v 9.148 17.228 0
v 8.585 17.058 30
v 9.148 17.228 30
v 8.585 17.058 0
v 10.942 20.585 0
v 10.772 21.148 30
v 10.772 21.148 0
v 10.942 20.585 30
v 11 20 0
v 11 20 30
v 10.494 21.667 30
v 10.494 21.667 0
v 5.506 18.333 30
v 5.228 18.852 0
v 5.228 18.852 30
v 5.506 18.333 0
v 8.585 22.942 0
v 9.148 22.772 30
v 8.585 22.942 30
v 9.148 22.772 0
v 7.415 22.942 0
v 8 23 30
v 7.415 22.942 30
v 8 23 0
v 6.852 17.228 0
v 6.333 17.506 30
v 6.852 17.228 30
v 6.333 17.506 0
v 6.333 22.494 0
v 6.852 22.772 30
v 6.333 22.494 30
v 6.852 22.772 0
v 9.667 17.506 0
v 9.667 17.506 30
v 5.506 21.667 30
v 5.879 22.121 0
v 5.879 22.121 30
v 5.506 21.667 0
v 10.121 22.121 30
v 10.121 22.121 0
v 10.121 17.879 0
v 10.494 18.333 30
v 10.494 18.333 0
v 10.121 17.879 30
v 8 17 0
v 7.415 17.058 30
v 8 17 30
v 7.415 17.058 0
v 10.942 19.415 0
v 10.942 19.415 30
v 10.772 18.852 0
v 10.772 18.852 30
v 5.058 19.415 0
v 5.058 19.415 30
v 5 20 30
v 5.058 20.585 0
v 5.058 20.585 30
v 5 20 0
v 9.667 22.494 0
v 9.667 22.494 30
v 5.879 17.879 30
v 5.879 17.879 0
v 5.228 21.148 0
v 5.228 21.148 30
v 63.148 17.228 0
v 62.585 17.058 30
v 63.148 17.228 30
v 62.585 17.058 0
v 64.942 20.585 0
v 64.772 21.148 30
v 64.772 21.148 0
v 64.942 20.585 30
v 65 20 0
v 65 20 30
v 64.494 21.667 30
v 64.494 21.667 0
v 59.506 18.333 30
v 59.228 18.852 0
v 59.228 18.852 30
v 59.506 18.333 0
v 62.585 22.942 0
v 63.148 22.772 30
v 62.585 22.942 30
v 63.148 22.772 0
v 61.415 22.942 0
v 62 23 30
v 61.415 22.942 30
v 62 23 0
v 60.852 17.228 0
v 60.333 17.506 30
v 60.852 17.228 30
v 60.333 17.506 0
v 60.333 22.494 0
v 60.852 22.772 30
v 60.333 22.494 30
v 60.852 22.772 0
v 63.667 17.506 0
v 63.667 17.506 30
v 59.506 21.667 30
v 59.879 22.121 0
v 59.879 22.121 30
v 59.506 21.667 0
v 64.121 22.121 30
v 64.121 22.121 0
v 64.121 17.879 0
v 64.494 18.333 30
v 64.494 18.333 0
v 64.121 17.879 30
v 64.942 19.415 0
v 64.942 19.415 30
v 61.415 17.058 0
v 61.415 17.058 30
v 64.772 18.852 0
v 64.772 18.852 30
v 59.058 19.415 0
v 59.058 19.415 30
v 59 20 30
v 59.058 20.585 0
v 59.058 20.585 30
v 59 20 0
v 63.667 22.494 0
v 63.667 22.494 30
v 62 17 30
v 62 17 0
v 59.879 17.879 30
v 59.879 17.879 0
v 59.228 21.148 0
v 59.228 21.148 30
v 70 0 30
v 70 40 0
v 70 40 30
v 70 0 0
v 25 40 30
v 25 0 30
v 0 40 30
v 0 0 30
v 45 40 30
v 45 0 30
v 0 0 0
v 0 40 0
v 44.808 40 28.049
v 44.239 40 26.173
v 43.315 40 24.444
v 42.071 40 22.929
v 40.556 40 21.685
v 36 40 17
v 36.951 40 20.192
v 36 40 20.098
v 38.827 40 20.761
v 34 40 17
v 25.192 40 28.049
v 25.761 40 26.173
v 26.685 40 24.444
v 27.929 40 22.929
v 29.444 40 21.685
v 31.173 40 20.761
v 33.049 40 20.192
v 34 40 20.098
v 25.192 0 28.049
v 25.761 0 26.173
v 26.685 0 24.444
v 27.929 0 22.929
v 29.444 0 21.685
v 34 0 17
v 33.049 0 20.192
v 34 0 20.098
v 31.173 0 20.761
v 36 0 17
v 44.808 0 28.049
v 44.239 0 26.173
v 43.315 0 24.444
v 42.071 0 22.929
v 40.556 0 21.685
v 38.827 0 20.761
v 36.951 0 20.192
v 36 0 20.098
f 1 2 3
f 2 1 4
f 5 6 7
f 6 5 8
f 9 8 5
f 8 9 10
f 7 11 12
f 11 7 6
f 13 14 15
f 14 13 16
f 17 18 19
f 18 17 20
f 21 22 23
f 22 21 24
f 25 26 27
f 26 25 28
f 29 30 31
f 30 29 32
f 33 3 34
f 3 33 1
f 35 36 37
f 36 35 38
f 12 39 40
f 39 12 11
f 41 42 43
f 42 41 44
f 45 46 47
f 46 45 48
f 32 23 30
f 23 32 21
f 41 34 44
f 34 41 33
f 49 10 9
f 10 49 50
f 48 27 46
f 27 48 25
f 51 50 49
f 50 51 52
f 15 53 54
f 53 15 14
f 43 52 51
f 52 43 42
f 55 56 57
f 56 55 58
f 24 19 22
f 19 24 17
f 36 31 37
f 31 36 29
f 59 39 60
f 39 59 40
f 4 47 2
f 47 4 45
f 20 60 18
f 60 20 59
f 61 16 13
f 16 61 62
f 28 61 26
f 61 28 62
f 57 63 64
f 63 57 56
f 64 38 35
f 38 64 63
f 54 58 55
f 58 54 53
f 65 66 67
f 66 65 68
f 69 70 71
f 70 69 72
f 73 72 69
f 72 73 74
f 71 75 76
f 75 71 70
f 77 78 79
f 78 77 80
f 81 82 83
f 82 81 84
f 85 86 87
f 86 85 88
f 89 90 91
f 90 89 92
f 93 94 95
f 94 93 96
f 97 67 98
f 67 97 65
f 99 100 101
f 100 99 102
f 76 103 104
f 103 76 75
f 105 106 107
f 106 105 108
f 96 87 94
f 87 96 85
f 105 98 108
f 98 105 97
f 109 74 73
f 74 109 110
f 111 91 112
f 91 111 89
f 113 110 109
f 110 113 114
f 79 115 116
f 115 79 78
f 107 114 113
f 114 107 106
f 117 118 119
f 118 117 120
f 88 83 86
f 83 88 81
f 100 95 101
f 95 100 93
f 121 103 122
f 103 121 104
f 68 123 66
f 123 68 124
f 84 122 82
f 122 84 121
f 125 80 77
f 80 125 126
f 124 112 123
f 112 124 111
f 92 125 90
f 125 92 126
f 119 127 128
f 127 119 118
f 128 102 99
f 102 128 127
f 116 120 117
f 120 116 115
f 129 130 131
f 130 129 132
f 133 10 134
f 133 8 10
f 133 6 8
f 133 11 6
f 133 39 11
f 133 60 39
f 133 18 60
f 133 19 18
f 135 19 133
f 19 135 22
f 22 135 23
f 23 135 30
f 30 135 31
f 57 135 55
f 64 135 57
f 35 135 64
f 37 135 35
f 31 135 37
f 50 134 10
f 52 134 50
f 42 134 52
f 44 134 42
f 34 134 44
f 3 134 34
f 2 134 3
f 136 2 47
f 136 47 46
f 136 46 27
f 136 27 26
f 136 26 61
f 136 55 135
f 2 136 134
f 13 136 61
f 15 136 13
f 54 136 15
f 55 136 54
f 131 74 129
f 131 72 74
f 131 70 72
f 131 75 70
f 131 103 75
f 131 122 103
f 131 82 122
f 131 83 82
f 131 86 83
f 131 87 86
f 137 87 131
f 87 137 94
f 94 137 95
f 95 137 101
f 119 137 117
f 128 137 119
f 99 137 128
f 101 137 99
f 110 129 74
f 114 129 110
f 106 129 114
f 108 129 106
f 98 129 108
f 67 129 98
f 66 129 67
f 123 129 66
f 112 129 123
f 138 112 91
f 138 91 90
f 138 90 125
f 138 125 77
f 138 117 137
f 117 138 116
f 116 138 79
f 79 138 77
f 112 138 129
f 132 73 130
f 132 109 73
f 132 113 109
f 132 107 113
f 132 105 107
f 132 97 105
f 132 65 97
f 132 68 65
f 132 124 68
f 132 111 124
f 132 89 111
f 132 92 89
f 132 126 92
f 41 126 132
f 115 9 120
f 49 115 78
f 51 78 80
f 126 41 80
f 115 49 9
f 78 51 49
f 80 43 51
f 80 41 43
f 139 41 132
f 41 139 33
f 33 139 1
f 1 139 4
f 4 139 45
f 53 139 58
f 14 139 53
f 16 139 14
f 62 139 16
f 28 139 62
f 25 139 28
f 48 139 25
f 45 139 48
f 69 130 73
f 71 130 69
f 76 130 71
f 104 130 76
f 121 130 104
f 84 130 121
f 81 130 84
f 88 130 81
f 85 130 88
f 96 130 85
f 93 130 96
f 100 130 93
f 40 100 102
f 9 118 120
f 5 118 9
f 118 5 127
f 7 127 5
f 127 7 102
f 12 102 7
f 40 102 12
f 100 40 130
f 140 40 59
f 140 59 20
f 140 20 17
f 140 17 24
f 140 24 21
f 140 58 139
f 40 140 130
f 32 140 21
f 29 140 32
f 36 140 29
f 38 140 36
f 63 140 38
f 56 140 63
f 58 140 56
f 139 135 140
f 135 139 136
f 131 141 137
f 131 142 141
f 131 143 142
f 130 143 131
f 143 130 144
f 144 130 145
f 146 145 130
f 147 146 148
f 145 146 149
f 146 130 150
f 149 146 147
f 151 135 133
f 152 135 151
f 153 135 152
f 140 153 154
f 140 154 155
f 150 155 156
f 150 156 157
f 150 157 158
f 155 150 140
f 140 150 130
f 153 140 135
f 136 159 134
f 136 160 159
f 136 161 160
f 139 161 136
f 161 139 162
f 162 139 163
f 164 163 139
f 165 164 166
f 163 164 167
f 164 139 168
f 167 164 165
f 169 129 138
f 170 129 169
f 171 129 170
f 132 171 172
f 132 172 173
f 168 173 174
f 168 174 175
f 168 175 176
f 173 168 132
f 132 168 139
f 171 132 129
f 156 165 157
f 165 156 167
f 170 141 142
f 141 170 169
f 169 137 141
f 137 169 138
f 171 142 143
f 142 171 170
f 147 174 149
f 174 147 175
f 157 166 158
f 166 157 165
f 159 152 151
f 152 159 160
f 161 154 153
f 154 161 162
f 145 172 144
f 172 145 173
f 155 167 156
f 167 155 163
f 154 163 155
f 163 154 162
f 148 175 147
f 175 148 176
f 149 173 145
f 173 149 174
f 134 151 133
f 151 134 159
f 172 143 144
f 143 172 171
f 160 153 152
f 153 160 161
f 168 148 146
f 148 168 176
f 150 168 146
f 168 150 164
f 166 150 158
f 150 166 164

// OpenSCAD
$fn = 32;

// ----------------------------------------------------------------------
// Saddle clamp: split shaft clamp
// ----------------------------------------------------------------------

// --- parameters (mm) ---
blk_l = 70;               // block length, X
blk_w = 40;               // block width, Y
blk_h = 30;               // block height
clamp_r = 10;             // shaft groove radius
hole_r = 3;               // bolt hole radius
hole_m = 8;               // bolt hole margin from the ends
saw_w = 2;                // saw kerf width

saw_depth = clamp_r + 3;  // saw kerf depth

difference() {
  cube([blk_l, blk_w, blk_h]);
  translate([blk_l / 2, -1, blk_h])
    rotate([-90, 0, 0])
      cylinder(h = blk_w + 2, r = clamp_r);
  for (sx = [0, 1])
    translate([sx ? blk_l - hole_m : hole_m, blk_w / 2, -1])
      cylinder(r = hole_r, h = blk_h + 2);
  translate([blk_l / 2 - saw_w / 2, -1, blk_h - saw_depth])
    cube([saw_w, blk_w + 2, saw_depth + 1]);
}
